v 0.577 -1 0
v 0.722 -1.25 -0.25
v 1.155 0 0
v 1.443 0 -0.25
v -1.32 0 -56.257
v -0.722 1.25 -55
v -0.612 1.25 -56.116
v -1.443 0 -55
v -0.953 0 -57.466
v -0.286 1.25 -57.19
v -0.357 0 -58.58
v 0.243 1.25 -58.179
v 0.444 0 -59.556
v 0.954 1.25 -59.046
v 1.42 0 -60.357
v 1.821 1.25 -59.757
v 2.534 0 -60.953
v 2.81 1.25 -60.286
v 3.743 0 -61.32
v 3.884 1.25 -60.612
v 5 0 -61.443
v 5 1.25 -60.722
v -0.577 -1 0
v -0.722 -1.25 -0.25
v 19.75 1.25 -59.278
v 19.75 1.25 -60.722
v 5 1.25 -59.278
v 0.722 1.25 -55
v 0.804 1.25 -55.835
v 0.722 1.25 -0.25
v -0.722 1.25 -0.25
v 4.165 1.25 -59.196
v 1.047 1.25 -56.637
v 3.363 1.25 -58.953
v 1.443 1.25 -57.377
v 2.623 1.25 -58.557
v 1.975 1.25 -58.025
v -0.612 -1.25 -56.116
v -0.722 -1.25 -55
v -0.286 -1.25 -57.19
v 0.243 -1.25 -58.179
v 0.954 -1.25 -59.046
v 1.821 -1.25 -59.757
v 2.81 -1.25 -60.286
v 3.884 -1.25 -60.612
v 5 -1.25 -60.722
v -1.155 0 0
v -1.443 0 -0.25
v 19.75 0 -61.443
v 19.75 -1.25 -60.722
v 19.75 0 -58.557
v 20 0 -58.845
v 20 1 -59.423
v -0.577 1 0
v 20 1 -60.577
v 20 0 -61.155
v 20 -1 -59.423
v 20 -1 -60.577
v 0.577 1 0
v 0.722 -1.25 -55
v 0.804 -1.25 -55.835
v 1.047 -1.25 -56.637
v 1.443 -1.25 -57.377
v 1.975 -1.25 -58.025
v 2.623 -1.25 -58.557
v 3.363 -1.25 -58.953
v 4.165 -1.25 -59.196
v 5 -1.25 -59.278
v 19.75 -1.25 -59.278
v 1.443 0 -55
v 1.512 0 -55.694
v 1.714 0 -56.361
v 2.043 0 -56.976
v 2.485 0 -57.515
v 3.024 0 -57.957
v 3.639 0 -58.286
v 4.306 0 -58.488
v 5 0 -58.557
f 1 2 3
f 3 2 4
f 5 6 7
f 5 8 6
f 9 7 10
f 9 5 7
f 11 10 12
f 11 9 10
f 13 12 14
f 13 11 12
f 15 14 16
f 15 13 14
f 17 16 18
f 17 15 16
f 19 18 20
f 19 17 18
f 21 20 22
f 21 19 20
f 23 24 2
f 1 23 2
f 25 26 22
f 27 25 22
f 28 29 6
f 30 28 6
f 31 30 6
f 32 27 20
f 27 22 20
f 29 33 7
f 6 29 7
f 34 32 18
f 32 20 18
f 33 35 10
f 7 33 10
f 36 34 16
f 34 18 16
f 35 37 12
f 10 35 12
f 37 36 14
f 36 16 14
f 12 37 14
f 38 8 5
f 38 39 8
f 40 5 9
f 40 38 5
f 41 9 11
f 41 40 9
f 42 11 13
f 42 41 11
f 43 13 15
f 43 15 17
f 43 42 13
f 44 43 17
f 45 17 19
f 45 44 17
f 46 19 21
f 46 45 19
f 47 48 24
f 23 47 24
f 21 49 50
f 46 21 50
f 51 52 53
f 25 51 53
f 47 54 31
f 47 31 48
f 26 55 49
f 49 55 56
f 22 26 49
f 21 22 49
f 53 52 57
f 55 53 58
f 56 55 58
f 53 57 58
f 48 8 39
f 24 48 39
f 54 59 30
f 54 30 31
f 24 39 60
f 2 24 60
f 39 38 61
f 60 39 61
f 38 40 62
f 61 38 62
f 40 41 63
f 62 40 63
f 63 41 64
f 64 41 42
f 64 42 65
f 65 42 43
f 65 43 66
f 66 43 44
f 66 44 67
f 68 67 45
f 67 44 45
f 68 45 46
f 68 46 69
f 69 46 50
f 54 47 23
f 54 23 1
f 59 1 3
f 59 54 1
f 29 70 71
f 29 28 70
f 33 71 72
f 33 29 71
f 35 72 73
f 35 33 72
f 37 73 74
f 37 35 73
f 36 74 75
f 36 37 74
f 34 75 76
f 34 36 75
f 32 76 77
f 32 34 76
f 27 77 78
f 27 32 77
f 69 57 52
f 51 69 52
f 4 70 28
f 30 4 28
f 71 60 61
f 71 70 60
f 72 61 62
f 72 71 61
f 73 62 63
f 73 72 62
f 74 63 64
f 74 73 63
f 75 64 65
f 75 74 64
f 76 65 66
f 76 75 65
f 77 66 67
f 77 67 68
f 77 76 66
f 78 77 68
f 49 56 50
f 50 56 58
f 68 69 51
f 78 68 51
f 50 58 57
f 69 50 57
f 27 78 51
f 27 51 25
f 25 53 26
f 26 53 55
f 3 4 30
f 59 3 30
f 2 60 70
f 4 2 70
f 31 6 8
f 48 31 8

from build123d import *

# Parameters (mm, degrees)
CHAMFER1_SIZE = 0.25
CHAMFER2_SIZE = 0.25


with BuildPart() as part:
    # Sweep1: sweep along a path in Sketch2
    with BuildLine(Plane(origin=(0, 0, 0), x_dir=(1, 0, 0), z_dir=(0, 1, 0))) as sweep1_path:
        Line((0, 0), (0, 55))
        ThreePointArc((0, 55), (1.464466094, 58.535533906), (5, 60))
        Line((5, 60), (20, 60))
    # Sketch1 → Sweep1 (sweep)
    with BuildSketch(Plane.XY):
        Polygon((0.721687836, 1.25), (-0.721687836, 1.25), (-1.443375673, 0), (-0.721687836, -1.25), (0.721687836, -1.25), (1.443375673, 0), align=None)
    sweep(path=sweep1_path.line)

    # Chamfer1
    chamfer1_edges = [part.edges().sort_by_distance(p)[0] for p in [
        (20, -1.25, -60),
        (20, -0.625, -58.917468245),
        (20, 0.625, -58.917468245),
        (20, 1.25, -60),
        (20, 0.625, -61.082531755),
        (20, -0.625, -61.082531755),
    ]]
    chamfer(chamfer1_edges, length=CHAMFER1_SIZE)

    # Chamfer2
    chamfer2_edges = [part.edges().sort_by_distance(p)[0] for p in [
        (0, 1.25, 0),
        (-1.082531755, 0.625, 0),
        (-1.082531755, -0.625, 0),
        (0, -1.25, 0),
        (1.082531755, -0.625, 0),
        (1.082531755, 0.625, 0),
    ]]
    chamfer(chamfer2_edges, length=CHAMFER2_SIZE)


solid = part.part
